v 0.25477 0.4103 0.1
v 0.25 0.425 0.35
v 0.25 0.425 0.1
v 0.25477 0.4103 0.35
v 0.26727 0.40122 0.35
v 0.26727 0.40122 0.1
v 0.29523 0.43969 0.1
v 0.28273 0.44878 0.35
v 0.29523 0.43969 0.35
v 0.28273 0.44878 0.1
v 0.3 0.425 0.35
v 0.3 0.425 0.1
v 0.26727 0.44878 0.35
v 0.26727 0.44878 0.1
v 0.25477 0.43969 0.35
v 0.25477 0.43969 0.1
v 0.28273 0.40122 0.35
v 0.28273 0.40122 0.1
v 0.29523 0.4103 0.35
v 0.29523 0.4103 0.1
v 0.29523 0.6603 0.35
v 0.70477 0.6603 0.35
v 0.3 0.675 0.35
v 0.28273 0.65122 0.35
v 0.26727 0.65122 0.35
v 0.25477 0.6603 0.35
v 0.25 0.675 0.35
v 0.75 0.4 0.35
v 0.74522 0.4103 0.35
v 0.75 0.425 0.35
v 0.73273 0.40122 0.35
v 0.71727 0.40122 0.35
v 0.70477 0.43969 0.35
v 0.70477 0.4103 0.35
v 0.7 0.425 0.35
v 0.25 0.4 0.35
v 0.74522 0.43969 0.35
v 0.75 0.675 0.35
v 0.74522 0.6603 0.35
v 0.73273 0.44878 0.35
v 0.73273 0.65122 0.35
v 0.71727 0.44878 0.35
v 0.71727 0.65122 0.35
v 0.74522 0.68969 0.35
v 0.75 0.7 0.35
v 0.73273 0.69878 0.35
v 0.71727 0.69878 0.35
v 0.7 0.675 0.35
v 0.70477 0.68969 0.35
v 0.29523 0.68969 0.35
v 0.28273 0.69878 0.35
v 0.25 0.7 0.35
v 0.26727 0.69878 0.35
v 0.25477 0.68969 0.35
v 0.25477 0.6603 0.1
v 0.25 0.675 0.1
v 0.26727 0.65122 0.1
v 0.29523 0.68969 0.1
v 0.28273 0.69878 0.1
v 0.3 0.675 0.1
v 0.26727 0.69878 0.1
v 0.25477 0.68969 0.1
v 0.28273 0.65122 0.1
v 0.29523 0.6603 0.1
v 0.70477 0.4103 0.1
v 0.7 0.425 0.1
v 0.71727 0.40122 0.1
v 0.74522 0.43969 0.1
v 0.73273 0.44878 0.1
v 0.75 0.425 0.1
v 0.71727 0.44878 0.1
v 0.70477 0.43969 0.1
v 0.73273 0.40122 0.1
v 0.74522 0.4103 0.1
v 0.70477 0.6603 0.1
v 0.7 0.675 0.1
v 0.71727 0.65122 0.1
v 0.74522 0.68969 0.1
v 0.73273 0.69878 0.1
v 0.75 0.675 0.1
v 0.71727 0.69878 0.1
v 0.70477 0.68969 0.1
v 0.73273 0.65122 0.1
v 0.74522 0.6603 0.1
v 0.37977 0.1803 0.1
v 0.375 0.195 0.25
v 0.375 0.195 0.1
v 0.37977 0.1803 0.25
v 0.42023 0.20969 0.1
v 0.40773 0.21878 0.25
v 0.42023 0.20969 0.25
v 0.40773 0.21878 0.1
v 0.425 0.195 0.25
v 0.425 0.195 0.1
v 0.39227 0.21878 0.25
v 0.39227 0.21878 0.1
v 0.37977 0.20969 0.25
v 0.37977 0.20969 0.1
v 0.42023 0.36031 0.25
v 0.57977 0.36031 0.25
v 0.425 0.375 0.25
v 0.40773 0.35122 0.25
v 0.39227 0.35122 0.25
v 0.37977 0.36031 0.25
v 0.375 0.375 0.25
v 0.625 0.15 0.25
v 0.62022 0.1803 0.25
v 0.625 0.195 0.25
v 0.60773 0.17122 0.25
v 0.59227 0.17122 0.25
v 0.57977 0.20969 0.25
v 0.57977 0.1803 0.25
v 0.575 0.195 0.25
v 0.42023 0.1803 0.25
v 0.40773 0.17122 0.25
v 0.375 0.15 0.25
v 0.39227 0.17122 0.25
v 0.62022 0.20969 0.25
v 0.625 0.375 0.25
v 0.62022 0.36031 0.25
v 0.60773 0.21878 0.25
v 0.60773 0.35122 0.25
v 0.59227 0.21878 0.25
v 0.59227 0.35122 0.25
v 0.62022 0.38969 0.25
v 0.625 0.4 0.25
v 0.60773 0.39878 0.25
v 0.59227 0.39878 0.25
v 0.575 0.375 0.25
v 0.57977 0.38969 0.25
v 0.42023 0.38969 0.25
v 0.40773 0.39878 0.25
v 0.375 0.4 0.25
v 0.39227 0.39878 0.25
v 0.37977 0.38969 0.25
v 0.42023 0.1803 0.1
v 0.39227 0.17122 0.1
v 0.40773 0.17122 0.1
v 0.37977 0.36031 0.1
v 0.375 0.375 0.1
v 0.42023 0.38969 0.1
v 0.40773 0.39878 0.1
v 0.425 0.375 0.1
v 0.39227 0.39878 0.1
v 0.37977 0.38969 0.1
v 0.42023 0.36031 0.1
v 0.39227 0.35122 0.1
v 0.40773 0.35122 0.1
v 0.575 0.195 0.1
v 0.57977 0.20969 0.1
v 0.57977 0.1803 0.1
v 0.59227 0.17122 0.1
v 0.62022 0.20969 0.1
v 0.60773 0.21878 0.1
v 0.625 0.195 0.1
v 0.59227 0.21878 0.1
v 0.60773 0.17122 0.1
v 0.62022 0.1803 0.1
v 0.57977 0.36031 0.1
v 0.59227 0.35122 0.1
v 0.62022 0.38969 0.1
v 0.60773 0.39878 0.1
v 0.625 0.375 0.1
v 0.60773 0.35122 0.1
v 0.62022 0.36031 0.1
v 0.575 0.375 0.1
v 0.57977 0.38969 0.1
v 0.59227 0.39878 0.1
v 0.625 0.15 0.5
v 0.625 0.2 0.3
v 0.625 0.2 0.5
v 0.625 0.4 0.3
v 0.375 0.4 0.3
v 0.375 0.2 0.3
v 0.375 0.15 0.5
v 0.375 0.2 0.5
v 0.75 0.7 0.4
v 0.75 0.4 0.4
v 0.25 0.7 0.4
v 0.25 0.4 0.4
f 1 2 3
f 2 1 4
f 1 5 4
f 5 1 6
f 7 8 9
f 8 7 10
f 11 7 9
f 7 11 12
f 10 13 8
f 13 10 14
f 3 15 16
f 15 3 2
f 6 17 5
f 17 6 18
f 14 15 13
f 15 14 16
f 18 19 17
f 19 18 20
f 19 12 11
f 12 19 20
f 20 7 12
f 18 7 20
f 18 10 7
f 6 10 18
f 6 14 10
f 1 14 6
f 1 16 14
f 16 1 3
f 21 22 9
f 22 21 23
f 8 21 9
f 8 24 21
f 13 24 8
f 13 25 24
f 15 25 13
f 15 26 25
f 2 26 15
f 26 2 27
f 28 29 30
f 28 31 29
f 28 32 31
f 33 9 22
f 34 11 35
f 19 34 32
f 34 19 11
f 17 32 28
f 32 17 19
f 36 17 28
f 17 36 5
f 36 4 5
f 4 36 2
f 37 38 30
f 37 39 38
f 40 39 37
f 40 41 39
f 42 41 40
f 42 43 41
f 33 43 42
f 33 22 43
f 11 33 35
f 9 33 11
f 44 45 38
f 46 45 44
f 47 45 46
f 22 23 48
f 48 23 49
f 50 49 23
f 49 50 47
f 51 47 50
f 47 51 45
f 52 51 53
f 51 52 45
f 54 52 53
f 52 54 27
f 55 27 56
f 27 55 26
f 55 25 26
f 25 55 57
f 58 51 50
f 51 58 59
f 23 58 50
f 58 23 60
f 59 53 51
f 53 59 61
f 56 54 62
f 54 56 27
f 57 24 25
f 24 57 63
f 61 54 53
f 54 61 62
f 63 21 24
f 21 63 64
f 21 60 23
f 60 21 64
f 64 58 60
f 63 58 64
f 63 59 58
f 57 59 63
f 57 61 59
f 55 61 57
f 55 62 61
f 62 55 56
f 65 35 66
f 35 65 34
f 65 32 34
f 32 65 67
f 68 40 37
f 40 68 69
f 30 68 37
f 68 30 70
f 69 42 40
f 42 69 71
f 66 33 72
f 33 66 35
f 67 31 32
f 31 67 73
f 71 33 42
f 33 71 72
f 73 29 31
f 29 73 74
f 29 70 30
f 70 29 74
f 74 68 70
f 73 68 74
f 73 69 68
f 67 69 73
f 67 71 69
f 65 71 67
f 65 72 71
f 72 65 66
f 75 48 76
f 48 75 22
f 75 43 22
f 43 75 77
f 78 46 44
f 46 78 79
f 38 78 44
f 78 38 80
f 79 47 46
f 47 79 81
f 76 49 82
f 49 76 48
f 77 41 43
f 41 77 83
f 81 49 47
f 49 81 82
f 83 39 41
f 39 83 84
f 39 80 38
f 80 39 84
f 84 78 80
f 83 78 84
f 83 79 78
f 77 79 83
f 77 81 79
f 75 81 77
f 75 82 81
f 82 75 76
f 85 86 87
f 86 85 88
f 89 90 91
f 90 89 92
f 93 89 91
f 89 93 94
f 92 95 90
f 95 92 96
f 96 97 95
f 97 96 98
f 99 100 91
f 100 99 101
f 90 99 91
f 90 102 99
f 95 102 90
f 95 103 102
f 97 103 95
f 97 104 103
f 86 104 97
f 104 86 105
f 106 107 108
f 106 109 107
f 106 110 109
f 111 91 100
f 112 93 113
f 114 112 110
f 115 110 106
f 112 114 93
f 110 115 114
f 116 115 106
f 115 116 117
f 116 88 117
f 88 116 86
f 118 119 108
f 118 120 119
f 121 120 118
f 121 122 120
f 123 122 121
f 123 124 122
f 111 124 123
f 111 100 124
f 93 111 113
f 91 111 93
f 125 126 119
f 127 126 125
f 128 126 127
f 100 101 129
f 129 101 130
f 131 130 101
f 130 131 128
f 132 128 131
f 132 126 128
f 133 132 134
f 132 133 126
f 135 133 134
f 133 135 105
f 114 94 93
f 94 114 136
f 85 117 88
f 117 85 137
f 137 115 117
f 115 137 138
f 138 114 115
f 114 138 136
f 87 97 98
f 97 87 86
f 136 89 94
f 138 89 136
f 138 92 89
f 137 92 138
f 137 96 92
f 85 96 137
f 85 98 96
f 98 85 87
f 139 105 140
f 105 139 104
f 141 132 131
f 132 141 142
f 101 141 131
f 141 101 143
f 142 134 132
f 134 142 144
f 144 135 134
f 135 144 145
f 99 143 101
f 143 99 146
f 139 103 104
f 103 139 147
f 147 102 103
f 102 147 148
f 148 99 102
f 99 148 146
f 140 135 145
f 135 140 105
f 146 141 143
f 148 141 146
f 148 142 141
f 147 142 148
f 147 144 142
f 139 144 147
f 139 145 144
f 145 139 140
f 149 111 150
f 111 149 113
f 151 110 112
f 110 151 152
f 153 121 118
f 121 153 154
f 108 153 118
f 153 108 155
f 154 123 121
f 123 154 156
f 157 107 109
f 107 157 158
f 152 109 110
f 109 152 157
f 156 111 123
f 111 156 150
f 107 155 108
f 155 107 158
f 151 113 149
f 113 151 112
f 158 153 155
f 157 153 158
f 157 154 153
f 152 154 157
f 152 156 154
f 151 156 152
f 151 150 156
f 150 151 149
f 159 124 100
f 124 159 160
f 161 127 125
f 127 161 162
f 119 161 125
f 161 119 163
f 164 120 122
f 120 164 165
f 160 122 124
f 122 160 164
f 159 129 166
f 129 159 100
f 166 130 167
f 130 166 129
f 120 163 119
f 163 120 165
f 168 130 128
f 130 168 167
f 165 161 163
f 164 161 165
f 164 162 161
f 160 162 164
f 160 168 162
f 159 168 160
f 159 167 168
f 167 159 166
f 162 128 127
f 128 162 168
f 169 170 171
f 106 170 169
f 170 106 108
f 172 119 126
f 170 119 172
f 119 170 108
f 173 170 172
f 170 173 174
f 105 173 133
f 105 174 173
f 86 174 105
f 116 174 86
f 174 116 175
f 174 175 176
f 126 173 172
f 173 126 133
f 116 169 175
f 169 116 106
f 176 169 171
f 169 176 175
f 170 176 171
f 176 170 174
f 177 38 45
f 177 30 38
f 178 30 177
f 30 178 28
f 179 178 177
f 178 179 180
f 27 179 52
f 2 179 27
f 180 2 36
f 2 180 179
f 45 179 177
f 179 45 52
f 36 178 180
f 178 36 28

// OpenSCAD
color([0.6, 0.4, 0.2])
translate([0.25, 0.4, 0.1]) {
    // Desk 
    translate([0,0,.25])
    cube([.5, 0.3, 0.05]);

    // Legs
    for(x=[0.025, 0.475])
    for(y=[0.025, 0.275])
    translate([x, y, 0])
    cylinder(0.25, r=0.025, $fn=10);


    // Chair
    translate([0.125, -0.25, 0.15]) {
        // Seat
        cube([0.25, 0.25, .05]);

        // Backrest
        cube([0.25, 0.05, 0.25]);

        // Legs
        for(x=[0.025, 0.225])
        for(y=[0.045, 0.225])
        translate([x, y, -0.15])
        cylinder(0.15, r=0.025, $fn=10);
    }
}
